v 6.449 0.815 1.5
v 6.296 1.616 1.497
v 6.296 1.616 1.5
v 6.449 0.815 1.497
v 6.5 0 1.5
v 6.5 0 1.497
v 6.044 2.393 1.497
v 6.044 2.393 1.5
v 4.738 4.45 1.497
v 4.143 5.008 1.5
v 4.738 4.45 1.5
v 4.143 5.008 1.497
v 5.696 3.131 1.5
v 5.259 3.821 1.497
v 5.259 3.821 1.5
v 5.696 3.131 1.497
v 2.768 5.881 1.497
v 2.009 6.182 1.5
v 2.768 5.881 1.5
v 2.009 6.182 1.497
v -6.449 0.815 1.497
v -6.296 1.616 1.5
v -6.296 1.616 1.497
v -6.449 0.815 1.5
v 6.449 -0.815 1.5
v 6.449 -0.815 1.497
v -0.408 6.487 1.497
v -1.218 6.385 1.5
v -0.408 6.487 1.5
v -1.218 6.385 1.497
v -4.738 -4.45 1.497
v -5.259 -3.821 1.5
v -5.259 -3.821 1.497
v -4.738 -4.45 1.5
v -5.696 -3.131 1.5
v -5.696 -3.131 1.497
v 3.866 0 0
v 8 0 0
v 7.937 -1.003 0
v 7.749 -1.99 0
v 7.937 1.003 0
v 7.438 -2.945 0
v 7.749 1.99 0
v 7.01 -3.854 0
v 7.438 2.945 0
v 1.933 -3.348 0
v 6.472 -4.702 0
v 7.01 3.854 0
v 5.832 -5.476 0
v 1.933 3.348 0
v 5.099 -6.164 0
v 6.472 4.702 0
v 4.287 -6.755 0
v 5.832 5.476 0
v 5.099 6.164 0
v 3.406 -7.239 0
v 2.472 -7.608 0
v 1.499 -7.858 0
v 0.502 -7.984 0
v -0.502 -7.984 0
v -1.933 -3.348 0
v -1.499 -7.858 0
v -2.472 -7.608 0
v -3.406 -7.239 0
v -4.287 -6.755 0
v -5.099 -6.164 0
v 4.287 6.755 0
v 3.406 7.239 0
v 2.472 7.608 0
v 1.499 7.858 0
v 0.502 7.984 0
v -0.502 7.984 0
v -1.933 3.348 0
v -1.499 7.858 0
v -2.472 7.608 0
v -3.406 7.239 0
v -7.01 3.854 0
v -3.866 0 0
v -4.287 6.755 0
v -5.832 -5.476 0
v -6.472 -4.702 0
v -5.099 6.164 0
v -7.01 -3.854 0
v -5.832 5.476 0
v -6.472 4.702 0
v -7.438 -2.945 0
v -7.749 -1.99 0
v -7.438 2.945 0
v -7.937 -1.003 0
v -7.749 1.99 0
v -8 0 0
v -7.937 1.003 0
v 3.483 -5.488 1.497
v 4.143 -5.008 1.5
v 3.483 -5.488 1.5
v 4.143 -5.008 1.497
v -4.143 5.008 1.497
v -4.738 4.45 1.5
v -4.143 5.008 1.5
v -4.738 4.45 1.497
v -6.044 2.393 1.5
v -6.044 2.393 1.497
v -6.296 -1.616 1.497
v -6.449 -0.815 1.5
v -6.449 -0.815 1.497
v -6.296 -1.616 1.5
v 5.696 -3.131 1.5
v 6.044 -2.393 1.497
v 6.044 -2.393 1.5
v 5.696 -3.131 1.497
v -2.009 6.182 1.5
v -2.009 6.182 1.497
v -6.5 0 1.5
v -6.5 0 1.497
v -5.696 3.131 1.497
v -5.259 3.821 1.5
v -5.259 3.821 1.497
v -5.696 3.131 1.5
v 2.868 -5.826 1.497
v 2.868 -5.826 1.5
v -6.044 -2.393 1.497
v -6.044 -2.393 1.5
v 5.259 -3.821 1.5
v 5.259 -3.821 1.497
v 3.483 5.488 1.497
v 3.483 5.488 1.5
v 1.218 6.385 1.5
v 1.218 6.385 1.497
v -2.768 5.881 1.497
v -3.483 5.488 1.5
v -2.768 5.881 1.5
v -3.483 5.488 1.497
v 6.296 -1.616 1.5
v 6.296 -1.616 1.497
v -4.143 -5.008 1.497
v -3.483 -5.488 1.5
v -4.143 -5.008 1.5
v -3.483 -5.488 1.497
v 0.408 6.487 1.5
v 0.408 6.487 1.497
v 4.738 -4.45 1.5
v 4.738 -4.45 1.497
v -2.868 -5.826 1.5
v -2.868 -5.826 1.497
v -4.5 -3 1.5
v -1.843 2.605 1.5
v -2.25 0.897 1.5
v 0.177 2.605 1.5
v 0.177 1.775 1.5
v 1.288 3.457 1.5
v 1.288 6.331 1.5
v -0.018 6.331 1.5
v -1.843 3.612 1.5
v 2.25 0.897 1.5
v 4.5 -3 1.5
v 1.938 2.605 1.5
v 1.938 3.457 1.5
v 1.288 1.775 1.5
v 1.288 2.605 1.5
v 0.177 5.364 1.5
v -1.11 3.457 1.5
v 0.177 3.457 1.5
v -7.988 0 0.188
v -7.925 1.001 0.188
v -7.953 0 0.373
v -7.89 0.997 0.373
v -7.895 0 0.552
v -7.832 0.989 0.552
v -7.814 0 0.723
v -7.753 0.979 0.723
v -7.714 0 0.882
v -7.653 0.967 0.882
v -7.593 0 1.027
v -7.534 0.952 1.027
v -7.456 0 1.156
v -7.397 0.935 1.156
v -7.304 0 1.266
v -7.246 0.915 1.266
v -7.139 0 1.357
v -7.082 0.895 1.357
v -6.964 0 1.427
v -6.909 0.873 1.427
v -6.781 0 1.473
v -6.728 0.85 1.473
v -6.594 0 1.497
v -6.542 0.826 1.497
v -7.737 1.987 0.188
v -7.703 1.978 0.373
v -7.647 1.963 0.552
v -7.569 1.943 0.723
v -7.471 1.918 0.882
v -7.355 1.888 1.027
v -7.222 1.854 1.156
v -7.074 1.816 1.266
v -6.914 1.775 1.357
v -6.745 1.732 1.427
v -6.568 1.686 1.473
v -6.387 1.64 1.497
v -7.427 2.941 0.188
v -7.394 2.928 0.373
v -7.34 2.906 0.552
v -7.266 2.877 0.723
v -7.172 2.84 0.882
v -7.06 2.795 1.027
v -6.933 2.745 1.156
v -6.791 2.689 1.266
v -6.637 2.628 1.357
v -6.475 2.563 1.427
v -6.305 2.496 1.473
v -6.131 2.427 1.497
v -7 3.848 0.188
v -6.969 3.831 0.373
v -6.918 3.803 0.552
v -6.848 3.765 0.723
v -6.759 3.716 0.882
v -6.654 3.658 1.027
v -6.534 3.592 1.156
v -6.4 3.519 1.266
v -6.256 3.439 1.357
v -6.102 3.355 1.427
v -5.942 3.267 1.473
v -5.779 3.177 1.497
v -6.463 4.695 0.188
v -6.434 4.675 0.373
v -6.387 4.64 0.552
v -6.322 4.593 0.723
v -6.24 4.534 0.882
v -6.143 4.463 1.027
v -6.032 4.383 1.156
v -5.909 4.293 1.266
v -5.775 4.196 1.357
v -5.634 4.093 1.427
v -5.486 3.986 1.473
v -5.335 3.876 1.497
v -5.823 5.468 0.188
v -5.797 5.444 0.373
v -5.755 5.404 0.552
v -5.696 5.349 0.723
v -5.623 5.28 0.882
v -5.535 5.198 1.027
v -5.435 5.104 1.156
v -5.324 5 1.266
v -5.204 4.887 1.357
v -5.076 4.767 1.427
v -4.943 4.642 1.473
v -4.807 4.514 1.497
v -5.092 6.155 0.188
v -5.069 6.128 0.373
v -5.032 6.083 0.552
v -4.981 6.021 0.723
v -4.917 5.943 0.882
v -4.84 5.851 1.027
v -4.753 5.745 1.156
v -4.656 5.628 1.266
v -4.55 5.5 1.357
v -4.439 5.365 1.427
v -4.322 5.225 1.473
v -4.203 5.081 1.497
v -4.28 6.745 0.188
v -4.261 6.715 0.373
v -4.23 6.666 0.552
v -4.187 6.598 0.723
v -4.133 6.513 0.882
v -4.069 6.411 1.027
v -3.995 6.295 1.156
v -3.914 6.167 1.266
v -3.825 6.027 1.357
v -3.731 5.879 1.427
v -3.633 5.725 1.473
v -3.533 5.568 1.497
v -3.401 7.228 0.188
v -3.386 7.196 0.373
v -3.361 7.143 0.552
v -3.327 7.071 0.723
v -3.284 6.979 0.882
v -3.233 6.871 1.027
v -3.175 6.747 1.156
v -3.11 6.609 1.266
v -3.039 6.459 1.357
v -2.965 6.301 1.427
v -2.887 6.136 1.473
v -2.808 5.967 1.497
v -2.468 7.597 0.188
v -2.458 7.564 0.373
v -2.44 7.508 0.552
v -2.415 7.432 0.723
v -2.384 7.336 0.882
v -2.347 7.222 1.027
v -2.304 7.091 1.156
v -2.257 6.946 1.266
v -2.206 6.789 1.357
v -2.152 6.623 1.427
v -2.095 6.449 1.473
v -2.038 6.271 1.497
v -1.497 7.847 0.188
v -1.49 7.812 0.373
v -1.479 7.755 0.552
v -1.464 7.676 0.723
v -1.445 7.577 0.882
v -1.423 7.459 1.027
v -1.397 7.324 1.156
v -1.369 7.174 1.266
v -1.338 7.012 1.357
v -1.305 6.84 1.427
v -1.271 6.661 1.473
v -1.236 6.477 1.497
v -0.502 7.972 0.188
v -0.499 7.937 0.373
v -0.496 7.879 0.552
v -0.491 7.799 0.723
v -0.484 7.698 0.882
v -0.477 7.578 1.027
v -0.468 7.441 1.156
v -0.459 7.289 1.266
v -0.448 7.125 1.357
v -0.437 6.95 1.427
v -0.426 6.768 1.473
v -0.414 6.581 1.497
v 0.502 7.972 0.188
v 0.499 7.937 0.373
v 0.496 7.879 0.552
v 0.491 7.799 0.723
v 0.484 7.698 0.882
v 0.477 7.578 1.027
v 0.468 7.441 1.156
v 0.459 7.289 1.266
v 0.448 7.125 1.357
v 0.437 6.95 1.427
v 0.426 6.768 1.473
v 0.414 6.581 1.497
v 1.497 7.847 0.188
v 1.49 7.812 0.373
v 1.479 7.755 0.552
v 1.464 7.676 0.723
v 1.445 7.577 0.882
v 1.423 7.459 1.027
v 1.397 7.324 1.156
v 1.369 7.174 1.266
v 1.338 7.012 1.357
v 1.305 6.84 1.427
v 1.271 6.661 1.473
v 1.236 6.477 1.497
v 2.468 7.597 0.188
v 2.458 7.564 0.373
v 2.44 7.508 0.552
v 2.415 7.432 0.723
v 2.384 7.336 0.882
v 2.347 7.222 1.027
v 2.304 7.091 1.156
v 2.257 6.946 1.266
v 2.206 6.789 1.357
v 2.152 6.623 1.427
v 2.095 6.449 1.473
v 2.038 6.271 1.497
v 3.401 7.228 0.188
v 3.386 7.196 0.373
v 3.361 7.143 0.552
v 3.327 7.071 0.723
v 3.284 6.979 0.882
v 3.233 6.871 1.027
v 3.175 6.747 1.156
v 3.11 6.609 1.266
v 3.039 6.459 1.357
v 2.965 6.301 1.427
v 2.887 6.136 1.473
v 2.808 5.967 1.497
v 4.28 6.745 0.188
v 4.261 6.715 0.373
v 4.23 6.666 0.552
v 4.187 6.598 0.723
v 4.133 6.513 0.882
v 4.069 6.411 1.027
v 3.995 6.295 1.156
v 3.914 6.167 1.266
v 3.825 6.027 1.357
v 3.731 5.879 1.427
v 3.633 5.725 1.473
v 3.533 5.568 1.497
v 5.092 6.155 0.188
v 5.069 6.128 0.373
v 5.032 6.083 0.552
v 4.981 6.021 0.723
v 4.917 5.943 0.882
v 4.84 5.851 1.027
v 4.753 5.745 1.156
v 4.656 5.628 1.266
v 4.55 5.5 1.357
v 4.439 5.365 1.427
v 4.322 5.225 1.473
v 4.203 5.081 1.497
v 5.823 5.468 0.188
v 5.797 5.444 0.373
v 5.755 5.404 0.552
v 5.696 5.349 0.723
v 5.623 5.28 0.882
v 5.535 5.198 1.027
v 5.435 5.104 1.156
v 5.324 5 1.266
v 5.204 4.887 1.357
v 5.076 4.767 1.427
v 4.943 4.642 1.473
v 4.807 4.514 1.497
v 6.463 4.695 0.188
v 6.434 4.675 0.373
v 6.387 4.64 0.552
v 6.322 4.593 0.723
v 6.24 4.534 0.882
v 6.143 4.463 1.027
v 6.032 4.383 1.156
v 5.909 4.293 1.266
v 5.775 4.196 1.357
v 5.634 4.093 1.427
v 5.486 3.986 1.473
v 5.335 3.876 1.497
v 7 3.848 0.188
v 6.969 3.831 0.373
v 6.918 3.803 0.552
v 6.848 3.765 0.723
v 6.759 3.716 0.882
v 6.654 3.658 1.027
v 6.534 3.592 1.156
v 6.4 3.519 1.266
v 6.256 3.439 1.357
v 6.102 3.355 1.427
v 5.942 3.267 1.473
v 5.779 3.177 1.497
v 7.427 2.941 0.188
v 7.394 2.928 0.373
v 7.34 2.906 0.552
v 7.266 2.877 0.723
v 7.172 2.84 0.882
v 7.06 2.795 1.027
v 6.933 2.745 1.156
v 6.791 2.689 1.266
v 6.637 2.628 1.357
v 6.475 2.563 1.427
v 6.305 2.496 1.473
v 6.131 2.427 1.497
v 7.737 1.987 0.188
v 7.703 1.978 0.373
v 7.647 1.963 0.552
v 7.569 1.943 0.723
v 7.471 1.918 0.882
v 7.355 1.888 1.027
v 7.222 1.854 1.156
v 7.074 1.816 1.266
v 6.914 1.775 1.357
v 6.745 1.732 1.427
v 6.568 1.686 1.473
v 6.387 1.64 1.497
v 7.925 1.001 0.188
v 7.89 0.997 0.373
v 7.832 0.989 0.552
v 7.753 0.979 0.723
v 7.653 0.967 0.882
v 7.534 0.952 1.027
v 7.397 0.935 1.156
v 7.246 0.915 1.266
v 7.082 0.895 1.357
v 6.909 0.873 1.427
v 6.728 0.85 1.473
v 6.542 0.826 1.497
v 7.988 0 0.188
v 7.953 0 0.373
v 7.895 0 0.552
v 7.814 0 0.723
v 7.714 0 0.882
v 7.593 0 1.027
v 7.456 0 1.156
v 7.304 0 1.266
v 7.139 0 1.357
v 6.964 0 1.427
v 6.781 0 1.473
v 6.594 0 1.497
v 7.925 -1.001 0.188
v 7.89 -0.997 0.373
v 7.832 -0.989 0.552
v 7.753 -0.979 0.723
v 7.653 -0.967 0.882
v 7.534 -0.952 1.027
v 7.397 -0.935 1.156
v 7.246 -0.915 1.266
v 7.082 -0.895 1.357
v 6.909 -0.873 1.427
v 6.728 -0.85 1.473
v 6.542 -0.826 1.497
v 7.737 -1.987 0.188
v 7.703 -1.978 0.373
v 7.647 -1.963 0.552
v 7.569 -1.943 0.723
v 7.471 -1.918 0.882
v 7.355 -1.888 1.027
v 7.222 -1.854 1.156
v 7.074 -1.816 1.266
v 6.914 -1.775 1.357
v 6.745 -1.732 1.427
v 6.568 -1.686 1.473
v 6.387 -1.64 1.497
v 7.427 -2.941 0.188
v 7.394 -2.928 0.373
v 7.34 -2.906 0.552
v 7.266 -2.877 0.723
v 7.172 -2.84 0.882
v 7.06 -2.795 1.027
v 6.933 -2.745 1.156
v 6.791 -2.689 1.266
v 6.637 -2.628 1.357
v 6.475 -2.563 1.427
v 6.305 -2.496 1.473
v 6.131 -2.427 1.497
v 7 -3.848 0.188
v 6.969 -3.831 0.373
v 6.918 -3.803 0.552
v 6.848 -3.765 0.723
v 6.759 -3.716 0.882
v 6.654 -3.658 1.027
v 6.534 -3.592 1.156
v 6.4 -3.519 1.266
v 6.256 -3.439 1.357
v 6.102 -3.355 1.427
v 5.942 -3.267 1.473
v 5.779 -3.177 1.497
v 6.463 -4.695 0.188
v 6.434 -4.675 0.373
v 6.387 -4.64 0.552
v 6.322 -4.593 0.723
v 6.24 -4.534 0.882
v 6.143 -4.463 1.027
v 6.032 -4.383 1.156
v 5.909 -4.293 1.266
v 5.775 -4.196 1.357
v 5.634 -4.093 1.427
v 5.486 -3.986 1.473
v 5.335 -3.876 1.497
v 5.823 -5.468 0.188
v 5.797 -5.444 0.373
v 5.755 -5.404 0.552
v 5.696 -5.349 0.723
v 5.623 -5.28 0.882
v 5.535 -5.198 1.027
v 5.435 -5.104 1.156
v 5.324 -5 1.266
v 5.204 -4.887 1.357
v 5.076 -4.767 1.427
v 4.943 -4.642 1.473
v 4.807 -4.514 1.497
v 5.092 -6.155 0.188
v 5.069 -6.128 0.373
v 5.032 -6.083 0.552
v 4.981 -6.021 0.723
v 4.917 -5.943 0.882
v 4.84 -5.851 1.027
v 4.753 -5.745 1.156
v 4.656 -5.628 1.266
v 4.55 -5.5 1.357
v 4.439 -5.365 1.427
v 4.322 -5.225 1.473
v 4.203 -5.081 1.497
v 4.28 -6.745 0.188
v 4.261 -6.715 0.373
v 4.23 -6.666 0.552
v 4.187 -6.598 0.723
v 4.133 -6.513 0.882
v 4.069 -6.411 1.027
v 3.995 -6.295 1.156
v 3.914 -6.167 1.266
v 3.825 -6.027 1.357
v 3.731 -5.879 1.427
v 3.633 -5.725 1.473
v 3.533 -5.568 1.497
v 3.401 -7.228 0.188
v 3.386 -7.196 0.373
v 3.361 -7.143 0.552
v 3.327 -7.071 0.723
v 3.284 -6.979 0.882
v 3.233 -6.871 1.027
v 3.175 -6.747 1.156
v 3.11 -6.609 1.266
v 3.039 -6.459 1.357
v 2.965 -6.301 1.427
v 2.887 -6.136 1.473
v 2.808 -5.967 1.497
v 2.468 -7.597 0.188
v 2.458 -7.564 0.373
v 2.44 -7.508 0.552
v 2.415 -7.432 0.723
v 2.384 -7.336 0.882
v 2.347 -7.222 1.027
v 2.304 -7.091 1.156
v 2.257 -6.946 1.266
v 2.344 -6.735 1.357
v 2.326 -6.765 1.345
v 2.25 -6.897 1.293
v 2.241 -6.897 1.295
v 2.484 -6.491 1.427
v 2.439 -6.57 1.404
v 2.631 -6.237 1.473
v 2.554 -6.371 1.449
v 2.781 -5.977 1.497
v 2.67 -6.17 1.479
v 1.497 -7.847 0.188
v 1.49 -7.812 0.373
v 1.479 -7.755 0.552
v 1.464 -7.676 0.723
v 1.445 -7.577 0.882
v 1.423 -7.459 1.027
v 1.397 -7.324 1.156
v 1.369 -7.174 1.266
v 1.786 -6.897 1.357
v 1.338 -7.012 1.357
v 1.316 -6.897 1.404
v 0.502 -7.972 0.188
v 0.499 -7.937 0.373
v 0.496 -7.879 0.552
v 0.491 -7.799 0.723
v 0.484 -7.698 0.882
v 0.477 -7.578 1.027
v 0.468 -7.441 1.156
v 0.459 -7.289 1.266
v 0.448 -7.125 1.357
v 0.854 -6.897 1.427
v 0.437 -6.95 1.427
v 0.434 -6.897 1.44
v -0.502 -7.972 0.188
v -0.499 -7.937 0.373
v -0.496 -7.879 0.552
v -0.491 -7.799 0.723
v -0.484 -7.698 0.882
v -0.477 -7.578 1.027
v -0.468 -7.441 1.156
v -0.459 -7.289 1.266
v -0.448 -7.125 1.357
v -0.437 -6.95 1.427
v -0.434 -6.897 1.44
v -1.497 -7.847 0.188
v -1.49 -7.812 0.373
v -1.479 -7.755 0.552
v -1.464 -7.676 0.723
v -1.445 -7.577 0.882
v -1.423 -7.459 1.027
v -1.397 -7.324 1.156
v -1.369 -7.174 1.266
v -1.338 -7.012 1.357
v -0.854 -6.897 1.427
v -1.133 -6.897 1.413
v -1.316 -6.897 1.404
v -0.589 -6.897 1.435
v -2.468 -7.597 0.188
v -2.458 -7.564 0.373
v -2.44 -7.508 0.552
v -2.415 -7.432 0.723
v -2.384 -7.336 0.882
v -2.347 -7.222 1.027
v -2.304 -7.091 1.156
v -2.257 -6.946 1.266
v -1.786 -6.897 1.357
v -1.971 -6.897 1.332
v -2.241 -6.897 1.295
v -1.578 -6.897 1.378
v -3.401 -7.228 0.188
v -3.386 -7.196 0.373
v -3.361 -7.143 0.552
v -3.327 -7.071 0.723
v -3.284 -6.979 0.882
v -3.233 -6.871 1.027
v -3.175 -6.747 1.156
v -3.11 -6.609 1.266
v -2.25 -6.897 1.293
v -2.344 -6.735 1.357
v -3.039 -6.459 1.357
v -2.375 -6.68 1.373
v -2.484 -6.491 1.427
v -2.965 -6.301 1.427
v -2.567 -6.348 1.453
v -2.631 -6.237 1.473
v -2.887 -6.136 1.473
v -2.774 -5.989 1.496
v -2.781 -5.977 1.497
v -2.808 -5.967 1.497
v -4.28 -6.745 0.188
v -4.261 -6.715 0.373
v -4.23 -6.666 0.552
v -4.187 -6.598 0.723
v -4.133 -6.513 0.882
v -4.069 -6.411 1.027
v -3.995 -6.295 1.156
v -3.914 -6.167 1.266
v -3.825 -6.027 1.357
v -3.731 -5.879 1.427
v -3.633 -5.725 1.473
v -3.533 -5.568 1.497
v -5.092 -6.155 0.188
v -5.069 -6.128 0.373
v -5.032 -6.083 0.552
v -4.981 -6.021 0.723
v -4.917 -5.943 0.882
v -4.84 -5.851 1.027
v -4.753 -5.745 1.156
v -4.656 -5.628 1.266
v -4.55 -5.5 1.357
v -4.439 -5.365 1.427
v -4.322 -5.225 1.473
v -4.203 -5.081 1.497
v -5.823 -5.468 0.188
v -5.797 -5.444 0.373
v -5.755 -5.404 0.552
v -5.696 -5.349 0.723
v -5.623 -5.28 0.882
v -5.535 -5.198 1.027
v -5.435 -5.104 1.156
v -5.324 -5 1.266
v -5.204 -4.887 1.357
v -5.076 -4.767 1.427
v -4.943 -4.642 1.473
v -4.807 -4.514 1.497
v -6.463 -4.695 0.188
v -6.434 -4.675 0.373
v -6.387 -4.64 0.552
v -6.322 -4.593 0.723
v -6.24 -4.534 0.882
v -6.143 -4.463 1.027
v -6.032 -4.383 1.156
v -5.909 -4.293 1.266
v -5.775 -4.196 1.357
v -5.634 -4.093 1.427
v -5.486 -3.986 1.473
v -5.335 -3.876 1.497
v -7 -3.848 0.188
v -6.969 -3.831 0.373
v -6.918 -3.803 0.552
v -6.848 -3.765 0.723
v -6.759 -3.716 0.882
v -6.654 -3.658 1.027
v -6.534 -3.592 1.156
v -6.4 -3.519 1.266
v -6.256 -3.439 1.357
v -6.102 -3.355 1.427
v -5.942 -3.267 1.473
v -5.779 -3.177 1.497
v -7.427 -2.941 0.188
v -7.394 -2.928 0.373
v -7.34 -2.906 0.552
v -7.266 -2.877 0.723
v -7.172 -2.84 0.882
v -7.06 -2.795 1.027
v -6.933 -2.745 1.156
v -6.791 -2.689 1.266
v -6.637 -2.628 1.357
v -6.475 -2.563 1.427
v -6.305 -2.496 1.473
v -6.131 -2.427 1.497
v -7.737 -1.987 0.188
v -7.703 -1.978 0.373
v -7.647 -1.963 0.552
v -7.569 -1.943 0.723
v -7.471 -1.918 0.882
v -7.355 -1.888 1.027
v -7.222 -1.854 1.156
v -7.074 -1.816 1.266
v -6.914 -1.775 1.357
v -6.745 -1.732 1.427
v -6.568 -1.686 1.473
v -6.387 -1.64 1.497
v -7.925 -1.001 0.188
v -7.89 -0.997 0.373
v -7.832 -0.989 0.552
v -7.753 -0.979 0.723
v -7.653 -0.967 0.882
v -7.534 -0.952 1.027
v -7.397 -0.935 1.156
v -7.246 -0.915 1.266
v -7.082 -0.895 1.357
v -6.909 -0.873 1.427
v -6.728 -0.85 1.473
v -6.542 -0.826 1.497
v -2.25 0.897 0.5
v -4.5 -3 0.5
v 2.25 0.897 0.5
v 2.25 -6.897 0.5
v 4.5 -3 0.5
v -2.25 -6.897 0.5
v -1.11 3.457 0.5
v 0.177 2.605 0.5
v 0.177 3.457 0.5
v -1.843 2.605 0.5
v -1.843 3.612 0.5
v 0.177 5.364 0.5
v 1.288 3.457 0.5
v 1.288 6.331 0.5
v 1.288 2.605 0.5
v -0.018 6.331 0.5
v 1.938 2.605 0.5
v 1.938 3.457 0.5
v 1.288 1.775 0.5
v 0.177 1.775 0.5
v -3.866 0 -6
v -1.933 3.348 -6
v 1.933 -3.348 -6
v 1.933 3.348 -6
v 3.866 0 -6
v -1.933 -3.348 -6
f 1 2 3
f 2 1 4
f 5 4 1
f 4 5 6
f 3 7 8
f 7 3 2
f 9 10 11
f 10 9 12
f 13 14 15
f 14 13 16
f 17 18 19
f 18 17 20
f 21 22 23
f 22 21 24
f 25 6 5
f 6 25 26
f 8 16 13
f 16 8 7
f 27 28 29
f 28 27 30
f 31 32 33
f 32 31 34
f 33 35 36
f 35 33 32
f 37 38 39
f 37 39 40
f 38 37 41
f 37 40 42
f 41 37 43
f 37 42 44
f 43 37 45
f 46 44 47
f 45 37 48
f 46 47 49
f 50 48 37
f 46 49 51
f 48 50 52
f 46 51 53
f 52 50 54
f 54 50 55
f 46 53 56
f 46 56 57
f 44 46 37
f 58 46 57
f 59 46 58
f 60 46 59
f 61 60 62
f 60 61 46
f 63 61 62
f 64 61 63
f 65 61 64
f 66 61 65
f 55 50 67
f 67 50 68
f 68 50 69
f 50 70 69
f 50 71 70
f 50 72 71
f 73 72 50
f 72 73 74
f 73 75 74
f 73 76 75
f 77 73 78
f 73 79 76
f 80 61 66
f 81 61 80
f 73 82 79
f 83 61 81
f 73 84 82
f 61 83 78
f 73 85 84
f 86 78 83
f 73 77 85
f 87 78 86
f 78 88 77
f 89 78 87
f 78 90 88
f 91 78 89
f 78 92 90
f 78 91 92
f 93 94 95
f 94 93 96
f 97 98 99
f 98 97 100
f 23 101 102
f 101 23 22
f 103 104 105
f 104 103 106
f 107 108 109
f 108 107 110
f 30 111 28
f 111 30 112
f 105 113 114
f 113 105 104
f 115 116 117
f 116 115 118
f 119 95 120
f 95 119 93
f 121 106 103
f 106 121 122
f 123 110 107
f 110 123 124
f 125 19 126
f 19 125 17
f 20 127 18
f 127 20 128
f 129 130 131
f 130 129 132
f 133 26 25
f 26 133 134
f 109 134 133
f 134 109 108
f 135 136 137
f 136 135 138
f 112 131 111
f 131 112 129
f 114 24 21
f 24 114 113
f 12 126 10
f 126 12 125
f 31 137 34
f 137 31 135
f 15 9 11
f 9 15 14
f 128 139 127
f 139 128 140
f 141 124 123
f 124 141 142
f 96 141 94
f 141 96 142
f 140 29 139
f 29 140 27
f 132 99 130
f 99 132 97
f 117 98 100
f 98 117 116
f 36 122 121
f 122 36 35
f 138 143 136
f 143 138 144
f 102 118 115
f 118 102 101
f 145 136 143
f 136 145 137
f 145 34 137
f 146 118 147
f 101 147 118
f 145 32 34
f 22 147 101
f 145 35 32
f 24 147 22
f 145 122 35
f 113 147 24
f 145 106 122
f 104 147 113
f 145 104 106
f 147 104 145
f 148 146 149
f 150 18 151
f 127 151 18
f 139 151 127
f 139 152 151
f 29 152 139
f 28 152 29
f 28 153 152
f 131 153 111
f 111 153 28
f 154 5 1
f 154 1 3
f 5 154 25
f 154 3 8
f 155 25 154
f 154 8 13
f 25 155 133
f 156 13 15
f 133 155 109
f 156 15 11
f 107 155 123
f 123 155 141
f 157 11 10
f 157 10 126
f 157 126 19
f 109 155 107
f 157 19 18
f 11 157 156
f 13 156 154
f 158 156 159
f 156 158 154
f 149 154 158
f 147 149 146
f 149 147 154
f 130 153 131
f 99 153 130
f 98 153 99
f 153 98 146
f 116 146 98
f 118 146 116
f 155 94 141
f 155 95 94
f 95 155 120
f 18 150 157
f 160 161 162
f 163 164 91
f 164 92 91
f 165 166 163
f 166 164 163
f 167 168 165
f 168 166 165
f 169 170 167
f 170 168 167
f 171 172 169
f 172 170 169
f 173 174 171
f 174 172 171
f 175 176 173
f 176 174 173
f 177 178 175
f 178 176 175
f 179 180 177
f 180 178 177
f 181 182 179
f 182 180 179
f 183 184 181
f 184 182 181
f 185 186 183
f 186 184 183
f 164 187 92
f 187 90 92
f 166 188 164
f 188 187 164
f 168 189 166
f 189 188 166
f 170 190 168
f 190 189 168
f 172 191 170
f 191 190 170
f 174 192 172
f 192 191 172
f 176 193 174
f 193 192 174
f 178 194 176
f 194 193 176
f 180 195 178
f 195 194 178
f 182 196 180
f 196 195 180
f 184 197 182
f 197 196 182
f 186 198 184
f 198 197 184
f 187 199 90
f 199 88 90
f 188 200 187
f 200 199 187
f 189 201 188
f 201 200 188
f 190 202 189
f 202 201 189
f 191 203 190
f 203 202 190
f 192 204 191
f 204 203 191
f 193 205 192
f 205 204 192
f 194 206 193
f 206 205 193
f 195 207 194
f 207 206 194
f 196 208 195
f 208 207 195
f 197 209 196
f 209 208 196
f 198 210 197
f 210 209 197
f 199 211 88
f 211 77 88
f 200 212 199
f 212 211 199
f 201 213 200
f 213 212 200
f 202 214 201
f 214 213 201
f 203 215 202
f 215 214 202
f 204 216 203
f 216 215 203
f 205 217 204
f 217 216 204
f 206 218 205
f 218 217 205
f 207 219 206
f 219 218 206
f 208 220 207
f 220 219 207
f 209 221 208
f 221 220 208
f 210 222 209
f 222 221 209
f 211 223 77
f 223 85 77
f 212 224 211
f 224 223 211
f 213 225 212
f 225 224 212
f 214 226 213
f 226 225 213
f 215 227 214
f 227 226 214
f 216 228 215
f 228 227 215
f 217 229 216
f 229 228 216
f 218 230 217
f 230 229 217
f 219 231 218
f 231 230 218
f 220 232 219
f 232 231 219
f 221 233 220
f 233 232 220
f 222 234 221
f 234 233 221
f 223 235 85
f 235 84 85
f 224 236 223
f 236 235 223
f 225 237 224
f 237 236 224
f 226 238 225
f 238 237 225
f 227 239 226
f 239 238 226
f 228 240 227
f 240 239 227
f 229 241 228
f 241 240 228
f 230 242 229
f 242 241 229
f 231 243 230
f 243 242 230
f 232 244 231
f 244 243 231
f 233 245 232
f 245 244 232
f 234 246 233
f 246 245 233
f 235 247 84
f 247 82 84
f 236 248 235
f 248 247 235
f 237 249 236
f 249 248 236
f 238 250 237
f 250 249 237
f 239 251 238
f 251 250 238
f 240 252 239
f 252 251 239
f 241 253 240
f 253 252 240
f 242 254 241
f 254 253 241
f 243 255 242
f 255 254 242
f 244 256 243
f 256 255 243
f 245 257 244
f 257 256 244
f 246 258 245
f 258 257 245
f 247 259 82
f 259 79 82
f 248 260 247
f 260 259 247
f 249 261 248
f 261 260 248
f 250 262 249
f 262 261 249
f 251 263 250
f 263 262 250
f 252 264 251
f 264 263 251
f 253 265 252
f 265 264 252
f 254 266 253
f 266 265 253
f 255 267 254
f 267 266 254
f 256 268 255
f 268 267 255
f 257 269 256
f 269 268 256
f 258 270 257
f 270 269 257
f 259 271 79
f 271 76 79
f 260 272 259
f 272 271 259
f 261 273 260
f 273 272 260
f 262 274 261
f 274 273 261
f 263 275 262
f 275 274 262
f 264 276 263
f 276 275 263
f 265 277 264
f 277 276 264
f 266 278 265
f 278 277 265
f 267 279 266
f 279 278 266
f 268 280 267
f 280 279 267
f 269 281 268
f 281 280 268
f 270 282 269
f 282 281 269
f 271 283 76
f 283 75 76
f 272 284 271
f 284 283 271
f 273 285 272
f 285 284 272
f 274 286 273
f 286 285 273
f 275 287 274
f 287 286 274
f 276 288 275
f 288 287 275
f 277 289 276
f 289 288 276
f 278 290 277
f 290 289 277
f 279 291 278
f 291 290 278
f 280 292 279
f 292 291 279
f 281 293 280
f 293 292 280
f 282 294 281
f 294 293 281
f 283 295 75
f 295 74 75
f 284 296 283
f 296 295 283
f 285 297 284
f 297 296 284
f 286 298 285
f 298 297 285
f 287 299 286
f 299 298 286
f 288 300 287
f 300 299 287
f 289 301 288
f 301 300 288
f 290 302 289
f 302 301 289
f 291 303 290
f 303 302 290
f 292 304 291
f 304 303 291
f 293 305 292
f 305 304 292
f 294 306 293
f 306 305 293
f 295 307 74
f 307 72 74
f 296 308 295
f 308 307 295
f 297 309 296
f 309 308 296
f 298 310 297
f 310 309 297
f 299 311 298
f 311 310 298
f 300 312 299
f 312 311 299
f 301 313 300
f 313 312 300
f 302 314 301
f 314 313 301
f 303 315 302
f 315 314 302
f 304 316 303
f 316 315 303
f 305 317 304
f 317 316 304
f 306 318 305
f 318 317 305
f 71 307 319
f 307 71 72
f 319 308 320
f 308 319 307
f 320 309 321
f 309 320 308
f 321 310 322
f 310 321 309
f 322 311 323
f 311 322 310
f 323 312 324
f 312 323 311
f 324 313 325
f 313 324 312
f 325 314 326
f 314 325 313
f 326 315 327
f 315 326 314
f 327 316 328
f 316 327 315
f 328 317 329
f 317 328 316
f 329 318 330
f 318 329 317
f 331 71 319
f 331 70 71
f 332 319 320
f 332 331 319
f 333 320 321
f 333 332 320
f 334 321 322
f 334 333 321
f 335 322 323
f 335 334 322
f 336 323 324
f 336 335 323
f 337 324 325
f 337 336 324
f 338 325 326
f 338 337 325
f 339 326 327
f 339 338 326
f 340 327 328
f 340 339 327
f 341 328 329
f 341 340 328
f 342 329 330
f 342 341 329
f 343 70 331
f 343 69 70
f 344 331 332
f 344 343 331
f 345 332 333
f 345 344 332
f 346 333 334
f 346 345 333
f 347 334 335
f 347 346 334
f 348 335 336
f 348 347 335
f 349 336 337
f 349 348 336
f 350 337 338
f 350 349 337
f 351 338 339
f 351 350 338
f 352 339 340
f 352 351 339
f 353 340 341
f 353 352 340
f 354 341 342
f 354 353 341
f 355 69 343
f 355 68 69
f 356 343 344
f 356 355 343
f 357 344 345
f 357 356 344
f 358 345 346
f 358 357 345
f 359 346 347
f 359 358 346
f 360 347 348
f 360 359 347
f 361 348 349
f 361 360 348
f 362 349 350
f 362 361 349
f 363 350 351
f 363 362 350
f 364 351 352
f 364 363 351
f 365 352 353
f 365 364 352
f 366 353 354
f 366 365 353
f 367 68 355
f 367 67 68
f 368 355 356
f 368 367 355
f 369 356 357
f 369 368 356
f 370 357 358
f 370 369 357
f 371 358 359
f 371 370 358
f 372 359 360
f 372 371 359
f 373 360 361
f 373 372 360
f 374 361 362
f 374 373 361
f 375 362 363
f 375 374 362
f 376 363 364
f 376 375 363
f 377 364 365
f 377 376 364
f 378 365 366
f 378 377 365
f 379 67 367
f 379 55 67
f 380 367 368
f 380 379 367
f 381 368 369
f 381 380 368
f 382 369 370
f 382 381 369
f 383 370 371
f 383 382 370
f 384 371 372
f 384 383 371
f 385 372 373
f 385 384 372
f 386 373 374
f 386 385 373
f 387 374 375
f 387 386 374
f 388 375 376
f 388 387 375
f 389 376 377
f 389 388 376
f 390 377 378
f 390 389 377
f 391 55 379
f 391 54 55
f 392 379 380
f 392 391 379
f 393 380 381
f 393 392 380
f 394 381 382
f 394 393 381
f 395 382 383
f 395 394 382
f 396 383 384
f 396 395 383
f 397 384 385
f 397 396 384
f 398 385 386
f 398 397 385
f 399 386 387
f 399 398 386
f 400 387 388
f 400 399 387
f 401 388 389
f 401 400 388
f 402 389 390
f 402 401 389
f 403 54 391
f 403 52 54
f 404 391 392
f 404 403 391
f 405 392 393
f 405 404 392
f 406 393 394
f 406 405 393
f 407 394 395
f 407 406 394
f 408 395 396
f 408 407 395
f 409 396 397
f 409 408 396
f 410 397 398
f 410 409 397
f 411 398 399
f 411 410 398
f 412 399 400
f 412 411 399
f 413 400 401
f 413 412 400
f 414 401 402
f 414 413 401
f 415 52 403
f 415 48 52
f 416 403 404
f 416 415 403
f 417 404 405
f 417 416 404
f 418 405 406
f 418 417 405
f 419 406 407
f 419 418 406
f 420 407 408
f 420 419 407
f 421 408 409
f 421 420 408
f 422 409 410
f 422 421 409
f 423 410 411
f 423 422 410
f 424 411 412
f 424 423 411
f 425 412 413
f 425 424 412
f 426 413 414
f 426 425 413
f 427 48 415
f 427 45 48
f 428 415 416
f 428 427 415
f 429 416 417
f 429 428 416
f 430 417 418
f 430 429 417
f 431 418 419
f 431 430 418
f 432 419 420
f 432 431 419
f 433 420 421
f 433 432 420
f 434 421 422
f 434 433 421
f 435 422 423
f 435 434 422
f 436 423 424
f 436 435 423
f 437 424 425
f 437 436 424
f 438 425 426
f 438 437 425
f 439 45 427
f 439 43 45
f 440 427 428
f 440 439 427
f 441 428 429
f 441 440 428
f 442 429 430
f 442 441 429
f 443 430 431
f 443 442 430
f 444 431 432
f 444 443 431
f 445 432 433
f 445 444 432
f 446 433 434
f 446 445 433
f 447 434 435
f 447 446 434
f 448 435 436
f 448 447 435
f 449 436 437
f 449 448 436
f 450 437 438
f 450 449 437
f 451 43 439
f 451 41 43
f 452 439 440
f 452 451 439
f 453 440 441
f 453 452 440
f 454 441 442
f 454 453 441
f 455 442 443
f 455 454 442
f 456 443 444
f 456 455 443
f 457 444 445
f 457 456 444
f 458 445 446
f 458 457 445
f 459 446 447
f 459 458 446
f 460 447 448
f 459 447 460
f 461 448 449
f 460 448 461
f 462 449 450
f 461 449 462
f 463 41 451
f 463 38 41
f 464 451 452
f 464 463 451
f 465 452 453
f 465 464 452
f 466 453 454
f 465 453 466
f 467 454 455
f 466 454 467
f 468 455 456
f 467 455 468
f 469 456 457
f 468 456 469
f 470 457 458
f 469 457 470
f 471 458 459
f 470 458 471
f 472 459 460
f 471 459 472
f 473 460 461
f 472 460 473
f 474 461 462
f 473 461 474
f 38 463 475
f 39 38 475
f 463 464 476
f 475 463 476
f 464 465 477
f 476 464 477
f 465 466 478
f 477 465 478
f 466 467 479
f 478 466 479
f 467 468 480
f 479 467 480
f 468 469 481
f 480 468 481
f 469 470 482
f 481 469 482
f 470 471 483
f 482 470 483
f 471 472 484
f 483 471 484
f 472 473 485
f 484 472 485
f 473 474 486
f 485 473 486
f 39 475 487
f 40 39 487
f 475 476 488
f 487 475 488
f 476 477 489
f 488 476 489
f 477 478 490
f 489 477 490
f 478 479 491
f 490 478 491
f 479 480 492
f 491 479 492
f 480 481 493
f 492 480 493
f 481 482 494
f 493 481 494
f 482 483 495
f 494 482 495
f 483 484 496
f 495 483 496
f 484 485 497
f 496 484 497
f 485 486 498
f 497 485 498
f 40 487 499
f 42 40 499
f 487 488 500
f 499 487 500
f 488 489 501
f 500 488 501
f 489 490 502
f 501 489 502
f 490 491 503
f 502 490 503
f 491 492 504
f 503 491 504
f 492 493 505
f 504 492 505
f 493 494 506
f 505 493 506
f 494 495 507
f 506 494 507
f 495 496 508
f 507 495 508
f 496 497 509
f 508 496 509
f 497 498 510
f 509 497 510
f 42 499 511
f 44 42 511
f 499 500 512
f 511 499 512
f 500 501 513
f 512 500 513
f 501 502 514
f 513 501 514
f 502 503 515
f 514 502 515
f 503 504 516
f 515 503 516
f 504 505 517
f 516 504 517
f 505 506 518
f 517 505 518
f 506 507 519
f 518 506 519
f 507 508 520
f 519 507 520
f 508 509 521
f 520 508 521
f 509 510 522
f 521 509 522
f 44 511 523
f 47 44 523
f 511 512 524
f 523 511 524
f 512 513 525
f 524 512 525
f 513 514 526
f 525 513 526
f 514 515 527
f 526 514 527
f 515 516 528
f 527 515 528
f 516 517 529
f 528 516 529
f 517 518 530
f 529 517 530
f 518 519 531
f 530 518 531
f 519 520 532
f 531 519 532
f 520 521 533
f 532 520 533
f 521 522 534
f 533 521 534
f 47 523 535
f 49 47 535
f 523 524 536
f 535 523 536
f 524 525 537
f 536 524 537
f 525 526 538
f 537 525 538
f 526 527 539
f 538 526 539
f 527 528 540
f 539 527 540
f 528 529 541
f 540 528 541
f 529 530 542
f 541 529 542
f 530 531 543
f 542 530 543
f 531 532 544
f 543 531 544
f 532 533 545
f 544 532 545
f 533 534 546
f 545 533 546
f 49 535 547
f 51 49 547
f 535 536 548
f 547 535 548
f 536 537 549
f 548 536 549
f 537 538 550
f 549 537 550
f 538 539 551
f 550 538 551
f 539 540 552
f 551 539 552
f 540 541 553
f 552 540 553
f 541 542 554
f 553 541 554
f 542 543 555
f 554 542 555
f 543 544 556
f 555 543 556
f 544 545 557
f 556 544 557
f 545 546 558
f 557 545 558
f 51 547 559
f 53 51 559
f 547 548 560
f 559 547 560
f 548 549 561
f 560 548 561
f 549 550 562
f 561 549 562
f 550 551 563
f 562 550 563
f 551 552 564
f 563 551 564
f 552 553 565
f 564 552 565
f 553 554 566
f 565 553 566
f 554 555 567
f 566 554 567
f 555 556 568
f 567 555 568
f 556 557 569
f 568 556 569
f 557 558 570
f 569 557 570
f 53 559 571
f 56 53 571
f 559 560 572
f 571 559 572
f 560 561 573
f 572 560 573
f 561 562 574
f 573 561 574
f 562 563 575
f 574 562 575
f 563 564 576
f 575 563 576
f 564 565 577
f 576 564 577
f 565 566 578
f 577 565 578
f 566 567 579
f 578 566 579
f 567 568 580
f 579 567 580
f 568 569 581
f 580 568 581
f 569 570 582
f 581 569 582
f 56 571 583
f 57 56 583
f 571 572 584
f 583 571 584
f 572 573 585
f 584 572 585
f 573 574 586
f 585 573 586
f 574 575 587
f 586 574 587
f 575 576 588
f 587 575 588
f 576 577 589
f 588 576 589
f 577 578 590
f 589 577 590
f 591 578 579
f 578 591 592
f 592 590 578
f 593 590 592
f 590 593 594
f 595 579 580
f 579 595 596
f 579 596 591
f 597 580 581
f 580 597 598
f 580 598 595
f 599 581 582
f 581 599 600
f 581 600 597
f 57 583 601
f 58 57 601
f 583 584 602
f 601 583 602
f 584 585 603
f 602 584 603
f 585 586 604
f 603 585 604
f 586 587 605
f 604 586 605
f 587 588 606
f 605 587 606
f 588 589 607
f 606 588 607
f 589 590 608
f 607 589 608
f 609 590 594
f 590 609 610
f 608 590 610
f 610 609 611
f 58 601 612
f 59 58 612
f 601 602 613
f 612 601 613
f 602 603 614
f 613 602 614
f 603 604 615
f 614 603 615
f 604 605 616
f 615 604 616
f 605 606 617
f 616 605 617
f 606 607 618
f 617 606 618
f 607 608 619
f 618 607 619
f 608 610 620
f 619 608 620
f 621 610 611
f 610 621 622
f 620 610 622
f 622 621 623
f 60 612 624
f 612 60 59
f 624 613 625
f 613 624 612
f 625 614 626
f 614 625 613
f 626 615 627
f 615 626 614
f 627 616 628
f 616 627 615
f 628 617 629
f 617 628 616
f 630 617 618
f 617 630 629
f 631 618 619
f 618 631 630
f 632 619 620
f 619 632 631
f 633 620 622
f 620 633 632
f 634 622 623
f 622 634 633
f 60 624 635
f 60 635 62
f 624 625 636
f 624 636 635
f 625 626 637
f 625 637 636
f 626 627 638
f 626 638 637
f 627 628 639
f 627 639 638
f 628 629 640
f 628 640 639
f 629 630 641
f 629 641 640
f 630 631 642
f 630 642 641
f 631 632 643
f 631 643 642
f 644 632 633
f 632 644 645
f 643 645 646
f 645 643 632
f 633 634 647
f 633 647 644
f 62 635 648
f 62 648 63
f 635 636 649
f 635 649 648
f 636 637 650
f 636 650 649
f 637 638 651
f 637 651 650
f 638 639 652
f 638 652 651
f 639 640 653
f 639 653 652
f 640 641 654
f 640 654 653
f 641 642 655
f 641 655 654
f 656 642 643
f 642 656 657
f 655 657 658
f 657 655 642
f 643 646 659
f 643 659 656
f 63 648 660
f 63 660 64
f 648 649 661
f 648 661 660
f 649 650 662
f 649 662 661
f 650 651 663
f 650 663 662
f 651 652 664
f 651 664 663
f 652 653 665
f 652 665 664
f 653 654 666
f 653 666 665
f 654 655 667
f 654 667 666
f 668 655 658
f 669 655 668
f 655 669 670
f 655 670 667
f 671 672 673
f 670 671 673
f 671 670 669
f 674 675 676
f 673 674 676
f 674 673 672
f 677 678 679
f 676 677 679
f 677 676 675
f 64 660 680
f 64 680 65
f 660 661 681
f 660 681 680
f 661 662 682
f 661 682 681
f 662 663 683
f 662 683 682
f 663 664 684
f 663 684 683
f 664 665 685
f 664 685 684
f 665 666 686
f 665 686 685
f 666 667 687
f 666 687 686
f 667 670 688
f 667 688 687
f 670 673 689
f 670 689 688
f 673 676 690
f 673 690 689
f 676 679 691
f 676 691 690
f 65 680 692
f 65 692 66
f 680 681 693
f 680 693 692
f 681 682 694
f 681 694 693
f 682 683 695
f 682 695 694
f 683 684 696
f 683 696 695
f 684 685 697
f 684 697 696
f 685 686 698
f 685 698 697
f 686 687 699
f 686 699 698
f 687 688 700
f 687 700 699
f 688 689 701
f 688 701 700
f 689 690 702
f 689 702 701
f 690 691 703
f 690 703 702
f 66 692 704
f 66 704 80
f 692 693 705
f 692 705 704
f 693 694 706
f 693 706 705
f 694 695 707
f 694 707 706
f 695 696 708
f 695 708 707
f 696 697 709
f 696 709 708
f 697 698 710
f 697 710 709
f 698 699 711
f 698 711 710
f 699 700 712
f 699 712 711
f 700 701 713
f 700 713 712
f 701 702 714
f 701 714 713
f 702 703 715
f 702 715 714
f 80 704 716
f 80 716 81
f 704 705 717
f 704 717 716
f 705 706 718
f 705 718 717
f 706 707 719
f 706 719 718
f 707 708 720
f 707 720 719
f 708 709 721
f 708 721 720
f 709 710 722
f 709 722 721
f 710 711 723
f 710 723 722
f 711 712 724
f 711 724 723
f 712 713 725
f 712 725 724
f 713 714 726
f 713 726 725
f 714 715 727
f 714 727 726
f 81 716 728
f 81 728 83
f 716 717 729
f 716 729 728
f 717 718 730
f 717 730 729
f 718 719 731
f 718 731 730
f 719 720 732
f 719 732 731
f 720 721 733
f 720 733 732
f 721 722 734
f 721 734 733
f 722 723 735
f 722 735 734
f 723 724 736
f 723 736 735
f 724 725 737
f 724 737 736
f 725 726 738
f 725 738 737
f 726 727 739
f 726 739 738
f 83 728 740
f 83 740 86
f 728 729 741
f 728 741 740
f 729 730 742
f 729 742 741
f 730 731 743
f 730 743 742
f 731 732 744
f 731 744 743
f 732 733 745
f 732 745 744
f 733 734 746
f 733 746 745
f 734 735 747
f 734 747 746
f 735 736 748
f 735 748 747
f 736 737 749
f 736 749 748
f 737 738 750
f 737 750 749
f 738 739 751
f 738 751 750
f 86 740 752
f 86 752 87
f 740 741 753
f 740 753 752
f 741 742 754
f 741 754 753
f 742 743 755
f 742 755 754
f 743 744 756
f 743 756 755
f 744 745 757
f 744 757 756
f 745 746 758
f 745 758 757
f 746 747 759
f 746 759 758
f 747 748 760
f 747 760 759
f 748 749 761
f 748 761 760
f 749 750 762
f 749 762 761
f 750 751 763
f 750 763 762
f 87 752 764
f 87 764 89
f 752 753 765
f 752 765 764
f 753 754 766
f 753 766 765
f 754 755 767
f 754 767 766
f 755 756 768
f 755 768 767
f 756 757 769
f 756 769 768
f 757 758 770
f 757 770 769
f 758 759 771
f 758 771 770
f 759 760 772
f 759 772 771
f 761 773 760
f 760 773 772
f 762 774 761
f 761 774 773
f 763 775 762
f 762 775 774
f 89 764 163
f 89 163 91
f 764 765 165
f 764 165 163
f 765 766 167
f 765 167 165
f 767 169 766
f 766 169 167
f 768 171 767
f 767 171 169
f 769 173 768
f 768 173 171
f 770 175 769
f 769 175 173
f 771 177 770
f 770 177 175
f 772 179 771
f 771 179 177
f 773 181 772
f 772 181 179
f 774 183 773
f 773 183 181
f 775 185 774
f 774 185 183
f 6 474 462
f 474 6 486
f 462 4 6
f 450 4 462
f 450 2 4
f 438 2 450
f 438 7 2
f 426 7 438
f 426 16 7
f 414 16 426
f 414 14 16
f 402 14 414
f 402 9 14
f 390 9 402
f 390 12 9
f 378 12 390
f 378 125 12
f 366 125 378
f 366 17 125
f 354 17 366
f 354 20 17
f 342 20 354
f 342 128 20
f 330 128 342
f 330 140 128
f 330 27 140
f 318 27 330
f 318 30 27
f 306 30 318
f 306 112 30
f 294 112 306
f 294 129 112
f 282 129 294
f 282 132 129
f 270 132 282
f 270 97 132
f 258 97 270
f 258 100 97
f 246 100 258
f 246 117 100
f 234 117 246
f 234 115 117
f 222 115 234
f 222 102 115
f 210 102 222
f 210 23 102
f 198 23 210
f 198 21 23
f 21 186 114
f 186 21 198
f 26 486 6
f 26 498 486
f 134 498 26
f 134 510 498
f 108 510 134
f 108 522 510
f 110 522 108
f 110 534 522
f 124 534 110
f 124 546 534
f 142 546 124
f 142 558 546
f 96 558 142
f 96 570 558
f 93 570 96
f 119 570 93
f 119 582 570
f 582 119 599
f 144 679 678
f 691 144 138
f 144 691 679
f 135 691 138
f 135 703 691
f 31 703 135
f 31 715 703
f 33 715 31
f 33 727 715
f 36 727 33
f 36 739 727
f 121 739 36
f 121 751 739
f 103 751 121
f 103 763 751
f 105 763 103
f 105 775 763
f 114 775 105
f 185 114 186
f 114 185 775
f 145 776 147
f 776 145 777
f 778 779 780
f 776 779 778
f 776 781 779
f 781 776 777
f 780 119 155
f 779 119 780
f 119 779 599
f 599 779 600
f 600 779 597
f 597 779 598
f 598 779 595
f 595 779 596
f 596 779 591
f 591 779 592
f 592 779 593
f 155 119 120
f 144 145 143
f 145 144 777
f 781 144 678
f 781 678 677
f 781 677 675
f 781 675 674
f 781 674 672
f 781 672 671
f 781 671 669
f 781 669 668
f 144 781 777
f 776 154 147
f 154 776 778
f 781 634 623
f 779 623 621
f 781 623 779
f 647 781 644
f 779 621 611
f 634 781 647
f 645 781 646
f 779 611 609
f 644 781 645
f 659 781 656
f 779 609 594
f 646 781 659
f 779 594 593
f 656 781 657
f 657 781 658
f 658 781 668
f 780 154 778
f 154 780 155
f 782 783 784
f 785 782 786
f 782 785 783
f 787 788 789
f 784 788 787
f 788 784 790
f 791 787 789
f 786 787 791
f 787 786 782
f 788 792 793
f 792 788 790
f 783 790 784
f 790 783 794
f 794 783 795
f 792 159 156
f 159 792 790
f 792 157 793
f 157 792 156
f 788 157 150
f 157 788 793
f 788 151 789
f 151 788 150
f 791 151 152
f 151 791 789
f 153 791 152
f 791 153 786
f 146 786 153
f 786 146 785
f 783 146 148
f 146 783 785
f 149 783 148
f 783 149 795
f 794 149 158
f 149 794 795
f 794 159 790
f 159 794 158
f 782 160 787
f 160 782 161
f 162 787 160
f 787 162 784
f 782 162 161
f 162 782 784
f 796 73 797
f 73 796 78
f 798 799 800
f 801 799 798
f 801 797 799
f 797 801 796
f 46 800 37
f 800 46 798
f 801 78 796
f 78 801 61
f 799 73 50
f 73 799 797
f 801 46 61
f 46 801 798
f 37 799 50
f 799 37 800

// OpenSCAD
$fn = 50;


union() {
	difference() {
		union() {
			cylinder(h = 1.5000000000, r = 6.5000000000);
			rotate_extrude(angle = 360) {
				translate(v = [6.5000000000, 0, 0]) {
					circle(r = 1.5000000000);
				}
			}
		}
		union() {
			translate(v = [-25.0000000000, -25.0000000000, -50]) {
				cube(size = [50, 50, 50]);
			}
			translate(v = [0, -3, 0.5000000000]) {
				#linear_extrude(height = 1) {
					polygon(points = [[4.5000000000, 0.0000000000], [2.2500000000, 3.8971143170], [-2.2500000000, 3.8971143170], [-4.5000000000, 0.0000000000], [-2.2500000000, -3.8971143170], [2.2500000000, -3.8971143170]]);
				}
			}
			#translate(v = [0, 4, 0.5000000000]) {
				linear_extrude(height = 1) {
					text(font = "SegoiUI:Bold", halign = "center", size = 4.5000000000, text = "4", valign = "center");
				}
			}
		}
	}
	union() {
		translate(v = [0, 0, -6]) {
			linear_extrude(height = 6) {
				polygon(points = [[3.8658550000, 0.0000000000], [1.9329275000, 3.3479286373], [-1.9329275000, 3.3479286373], [-3.8658550000, 0.0000000000], [-1.9329275000, -3.3479286373], [1.9329275000, -3.3479286373]]);
			}
		}
	}
}
